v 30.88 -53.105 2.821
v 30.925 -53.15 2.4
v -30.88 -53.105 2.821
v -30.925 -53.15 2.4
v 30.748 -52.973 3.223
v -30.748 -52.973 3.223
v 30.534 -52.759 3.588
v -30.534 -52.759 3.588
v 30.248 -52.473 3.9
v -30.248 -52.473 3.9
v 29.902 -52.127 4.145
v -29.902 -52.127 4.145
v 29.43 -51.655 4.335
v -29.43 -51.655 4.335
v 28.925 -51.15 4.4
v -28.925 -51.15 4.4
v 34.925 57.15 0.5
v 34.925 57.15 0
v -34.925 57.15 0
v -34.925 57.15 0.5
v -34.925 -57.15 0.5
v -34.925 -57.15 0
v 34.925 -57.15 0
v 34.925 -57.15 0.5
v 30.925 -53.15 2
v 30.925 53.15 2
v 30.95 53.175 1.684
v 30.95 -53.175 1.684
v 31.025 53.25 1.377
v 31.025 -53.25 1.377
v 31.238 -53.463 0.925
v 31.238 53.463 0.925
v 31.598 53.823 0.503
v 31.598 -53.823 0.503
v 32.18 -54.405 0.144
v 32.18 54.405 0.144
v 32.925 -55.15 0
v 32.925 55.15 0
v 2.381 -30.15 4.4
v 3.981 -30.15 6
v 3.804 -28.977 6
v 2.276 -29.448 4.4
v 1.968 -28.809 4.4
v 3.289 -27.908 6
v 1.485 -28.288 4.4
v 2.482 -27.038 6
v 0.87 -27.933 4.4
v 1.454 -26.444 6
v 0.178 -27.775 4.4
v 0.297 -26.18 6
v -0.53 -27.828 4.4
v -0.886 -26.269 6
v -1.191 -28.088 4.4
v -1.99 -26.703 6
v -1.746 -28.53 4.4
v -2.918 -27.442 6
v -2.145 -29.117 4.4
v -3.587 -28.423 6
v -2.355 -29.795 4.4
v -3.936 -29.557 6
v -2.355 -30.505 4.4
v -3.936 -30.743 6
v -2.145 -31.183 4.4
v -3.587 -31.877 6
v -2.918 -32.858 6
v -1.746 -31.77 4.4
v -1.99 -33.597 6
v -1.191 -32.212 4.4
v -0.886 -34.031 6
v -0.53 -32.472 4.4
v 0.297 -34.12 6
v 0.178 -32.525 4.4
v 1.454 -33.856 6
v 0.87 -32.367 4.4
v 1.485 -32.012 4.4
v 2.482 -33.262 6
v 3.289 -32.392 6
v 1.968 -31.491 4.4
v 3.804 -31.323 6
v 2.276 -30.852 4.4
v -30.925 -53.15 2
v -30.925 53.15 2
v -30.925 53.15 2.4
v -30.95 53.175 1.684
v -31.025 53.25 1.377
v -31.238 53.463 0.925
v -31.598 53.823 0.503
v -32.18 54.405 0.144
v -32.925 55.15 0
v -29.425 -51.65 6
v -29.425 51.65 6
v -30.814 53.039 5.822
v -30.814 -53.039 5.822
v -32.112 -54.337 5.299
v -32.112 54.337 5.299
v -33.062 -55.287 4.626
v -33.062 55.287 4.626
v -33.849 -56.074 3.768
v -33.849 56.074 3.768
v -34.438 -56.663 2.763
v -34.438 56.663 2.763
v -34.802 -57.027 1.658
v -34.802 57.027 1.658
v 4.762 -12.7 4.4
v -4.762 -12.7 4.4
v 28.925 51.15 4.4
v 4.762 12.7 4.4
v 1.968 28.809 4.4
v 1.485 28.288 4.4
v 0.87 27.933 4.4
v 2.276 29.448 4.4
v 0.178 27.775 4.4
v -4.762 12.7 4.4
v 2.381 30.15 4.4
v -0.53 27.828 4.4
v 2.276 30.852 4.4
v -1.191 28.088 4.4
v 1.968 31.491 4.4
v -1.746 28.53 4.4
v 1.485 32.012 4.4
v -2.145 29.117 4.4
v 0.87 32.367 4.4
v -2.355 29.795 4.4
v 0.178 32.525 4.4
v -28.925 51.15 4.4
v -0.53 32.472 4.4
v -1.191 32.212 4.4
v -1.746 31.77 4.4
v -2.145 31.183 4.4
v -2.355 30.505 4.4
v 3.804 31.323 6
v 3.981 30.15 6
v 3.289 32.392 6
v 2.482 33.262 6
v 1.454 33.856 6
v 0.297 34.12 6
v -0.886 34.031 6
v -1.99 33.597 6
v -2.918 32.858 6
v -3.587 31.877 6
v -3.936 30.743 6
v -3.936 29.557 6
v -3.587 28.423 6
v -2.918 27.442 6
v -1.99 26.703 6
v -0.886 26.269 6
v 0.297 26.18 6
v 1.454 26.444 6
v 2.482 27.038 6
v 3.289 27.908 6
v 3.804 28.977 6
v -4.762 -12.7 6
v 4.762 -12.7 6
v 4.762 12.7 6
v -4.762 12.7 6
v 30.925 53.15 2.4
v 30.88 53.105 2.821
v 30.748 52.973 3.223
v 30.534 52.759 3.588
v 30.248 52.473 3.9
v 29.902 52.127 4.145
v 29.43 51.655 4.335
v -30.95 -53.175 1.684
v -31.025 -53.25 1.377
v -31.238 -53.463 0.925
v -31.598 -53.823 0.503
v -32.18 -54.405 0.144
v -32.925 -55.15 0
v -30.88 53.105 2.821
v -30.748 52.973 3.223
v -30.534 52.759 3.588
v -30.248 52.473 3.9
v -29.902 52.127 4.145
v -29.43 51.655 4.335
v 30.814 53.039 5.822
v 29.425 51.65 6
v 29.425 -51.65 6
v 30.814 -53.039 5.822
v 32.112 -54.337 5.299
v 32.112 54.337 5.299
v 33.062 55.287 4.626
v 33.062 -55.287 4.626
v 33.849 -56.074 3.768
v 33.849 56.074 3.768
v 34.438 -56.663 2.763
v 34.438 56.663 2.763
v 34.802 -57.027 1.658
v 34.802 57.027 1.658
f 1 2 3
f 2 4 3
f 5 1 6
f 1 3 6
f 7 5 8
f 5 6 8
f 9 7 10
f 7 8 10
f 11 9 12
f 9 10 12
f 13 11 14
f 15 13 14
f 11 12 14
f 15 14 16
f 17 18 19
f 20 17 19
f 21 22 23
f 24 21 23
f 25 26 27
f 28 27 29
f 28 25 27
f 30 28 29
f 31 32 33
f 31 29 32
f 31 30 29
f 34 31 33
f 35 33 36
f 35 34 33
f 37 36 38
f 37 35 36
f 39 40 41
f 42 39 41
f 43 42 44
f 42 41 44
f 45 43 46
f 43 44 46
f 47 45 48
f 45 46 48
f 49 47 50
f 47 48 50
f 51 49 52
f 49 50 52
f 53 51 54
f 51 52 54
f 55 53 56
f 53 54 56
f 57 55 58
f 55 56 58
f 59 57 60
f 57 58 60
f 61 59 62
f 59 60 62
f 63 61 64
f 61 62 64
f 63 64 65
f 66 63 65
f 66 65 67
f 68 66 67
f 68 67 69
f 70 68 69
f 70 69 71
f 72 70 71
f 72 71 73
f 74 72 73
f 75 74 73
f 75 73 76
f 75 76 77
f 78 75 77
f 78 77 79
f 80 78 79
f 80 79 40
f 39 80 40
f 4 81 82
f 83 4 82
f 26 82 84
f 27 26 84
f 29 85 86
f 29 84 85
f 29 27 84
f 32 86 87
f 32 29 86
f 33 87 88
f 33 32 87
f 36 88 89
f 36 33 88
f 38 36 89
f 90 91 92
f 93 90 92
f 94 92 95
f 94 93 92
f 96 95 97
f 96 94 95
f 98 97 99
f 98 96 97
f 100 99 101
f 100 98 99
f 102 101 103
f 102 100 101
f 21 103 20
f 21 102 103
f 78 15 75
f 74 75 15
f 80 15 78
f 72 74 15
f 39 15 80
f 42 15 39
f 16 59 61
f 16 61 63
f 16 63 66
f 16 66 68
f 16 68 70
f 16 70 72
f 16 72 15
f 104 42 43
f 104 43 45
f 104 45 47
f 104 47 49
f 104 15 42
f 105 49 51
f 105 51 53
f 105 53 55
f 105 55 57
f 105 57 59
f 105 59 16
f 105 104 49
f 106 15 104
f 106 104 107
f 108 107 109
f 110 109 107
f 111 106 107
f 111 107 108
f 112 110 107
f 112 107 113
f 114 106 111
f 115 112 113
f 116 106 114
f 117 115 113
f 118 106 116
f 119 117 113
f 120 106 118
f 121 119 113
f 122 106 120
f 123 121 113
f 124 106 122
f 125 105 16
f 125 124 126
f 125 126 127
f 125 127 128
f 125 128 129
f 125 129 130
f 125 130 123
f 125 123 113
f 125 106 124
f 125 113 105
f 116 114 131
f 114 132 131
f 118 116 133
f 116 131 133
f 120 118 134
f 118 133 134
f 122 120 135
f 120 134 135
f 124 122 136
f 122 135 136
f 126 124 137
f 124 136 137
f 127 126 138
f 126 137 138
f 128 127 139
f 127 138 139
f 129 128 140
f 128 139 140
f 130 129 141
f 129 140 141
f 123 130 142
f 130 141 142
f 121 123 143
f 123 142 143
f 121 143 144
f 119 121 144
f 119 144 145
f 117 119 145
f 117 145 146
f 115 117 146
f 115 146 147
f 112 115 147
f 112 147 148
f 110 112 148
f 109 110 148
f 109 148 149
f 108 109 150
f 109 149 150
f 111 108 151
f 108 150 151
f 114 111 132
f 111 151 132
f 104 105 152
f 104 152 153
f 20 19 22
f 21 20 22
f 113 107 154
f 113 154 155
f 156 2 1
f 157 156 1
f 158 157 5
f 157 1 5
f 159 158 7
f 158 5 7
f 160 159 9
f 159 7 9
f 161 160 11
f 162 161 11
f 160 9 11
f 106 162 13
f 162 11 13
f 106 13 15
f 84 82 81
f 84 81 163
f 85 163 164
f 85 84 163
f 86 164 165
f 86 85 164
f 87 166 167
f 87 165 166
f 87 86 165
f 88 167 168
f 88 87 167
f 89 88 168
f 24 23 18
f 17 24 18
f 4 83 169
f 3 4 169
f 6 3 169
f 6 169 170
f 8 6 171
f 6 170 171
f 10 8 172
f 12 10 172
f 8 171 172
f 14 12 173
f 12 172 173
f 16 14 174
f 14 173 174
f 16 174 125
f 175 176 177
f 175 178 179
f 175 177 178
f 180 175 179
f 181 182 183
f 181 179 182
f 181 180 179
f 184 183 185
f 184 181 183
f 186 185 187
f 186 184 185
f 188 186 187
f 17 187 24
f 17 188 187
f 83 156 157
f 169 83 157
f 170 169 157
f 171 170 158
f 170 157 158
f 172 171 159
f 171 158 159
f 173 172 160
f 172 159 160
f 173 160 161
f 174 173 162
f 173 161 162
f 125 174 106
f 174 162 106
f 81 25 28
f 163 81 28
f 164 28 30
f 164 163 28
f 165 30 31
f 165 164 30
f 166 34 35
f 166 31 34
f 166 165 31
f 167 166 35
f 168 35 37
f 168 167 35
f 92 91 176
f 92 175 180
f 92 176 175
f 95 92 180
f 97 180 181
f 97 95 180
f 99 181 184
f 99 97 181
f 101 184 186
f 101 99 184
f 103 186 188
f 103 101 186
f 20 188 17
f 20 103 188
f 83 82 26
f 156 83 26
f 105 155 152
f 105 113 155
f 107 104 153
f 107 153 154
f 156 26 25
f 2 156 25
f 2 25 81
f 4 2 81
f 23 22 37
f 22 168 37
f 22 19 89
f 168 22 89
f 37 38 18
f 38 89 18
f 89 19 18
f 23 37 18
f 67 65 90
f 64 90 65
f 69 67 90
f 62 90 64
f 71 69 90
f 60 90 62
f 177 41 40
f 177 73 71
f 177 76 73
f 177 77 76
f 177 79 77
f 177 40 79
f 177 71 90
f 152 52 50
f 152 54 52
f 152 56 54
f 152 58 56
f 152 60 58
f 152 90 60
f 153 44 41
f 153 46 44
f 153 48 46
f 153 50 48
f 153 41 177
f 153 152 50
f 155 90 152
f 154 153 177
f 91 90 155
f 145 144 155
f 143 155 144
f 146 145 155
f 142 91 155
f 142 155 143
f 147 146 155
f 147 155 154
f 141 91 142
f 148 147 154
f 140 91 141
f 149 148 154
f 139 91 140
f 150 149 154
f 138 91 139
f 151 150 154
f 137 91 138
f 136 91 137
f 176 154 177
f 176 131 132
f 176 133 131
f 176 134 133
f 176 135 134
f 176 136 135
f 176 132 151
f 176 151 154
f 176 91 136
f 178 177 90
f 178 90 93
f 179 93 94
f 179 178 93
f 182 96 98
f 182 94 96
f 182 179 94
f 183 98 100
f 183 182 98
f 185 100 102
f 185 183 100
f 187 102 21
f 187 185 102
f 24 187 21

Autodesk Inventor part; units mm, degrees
ref_plane "YZ Plane" through (0, 0, 0) normal (1, 0, 0) x (0, 1, 0)
ref_plane "XZ Plane" through (0, 0, 0) normal (0, 1, 0) x (-1, 0, 0)
ref_plane "XY Plane" through (0, 0, 0) normal (0, 0, 1) x (1, 0, 0)
sketch "Sketch1" plane through (0, 0, 0) normal (0, 0, 1) x (1, 0, 0)
  line L0 (-34.925, -57.15) -> (34.925, -57.15)
  line L1 (34.925, -57.15) -> (34.925, 57.15)
  line L2 (34.925, 57.15) -> (-34.925, 57.15)
  line L3 (-34.925, 57.15) -> (-34.925, -57.15)
  line L4 (-34.925, -57.15) -> (34.925, 57.15) construction
  line L5 (34.925, -57.15) -> (-34.925, 57.15) construction
  line L6 (-4.7625, -12.7) -> (4.7625, -12.7)
  line L7 (4.7625, -12.7) -> (4.7625, 12.7)
  line L8 (4.7625, 12.7) -> (-4.7625, 12.7)
  line L9 (-4.7625, 12.7) -> (-4.7625, -12.7)
  line L10 (-4.7625, -12.7) -> (4.7625, 12.7) construction
  line L11 (4.7625, -12.7) -> (-4.7625, 12.7) construction
  point P0 (0, 0)
  dimension "d0" = 69.85
  dimension "d1" = 114.3
  dimension "d2" = 9.525
  dimension "d3" = 25.4
extrude "Extrusion1" add sketch "Sketch1" along normal blind 6
fillet "Fillet1" radius 5.5 4 edges at (0, 57.15, 6) (-34.925, 0, 6) (34.925, 0, 6) (0, -57.15, 6)
sketch "Sketch2" plane through (0, 0, 0) normal (0, 0, -1) x (-1, 0, 0)
  line L0 (-30.925, -53.15) -> (30.925, -53.15)
  line L1 (30.925, -53.15) -> (30.925, 53.15)
  line L2 (30.925, 53.15) -> (-30.925, 53.15)
  line L3 (-30.925, 53.15) -> (-30.925, -53.15)
  line L4 (-30.925, -53.15) -> (30.925, 53.15) construction
  line L5 (30.925, -53.15) -> (-30.925, 53.15) construction
  line L6 (-34.925, 57.15) -> (34.925, 57.15) projected
  line L7 (34.925, 57.15) -> (34.925, -57.15) projected
  point P0 (0, 0)
  dimension "d9" = 4
  dimension "d10" = 4
extrude "Extrusion2" cut sketch "Sketch2" against normal blind 4.4
fillet "Fillet2" radius 2 8 edges at (-30.925, 0, 0) (0, -53.15, 0) (0, 53.15, 0) (0, 53.15, 4.4) (30.925, 0, 4.4) (-30.925, 0, 4.4) (30.925, 0, 0) (0, -53.15, 4.4)
sketch "Sketch3" plane through (0, 0, 6) normal (0, 0, 1) x (1, 0, 0)
  circle A0 centre (0, 30.15) radius 2.3813
  circle A1 centre (0, -30.15) radius 2.3813
  point P0 (0, 0)
  dimension "d14" = 60.3
  dimension "d15" = 4.7625
  dimension "d16" = 30.15
  dimension "d18" = 30.15
extrude "Extrusion3" cut sketch "Sketch3" against normal through all
chamfer "Chamfer1" distance 1.6 angle 45 2 edges at (-2.3813, 30.15, 6) (-2.3813, -30.15, 6)
equation "\"d9\" = d10"
equation "\"d16\" = d18"
properties part number "Light Switch Cover"
